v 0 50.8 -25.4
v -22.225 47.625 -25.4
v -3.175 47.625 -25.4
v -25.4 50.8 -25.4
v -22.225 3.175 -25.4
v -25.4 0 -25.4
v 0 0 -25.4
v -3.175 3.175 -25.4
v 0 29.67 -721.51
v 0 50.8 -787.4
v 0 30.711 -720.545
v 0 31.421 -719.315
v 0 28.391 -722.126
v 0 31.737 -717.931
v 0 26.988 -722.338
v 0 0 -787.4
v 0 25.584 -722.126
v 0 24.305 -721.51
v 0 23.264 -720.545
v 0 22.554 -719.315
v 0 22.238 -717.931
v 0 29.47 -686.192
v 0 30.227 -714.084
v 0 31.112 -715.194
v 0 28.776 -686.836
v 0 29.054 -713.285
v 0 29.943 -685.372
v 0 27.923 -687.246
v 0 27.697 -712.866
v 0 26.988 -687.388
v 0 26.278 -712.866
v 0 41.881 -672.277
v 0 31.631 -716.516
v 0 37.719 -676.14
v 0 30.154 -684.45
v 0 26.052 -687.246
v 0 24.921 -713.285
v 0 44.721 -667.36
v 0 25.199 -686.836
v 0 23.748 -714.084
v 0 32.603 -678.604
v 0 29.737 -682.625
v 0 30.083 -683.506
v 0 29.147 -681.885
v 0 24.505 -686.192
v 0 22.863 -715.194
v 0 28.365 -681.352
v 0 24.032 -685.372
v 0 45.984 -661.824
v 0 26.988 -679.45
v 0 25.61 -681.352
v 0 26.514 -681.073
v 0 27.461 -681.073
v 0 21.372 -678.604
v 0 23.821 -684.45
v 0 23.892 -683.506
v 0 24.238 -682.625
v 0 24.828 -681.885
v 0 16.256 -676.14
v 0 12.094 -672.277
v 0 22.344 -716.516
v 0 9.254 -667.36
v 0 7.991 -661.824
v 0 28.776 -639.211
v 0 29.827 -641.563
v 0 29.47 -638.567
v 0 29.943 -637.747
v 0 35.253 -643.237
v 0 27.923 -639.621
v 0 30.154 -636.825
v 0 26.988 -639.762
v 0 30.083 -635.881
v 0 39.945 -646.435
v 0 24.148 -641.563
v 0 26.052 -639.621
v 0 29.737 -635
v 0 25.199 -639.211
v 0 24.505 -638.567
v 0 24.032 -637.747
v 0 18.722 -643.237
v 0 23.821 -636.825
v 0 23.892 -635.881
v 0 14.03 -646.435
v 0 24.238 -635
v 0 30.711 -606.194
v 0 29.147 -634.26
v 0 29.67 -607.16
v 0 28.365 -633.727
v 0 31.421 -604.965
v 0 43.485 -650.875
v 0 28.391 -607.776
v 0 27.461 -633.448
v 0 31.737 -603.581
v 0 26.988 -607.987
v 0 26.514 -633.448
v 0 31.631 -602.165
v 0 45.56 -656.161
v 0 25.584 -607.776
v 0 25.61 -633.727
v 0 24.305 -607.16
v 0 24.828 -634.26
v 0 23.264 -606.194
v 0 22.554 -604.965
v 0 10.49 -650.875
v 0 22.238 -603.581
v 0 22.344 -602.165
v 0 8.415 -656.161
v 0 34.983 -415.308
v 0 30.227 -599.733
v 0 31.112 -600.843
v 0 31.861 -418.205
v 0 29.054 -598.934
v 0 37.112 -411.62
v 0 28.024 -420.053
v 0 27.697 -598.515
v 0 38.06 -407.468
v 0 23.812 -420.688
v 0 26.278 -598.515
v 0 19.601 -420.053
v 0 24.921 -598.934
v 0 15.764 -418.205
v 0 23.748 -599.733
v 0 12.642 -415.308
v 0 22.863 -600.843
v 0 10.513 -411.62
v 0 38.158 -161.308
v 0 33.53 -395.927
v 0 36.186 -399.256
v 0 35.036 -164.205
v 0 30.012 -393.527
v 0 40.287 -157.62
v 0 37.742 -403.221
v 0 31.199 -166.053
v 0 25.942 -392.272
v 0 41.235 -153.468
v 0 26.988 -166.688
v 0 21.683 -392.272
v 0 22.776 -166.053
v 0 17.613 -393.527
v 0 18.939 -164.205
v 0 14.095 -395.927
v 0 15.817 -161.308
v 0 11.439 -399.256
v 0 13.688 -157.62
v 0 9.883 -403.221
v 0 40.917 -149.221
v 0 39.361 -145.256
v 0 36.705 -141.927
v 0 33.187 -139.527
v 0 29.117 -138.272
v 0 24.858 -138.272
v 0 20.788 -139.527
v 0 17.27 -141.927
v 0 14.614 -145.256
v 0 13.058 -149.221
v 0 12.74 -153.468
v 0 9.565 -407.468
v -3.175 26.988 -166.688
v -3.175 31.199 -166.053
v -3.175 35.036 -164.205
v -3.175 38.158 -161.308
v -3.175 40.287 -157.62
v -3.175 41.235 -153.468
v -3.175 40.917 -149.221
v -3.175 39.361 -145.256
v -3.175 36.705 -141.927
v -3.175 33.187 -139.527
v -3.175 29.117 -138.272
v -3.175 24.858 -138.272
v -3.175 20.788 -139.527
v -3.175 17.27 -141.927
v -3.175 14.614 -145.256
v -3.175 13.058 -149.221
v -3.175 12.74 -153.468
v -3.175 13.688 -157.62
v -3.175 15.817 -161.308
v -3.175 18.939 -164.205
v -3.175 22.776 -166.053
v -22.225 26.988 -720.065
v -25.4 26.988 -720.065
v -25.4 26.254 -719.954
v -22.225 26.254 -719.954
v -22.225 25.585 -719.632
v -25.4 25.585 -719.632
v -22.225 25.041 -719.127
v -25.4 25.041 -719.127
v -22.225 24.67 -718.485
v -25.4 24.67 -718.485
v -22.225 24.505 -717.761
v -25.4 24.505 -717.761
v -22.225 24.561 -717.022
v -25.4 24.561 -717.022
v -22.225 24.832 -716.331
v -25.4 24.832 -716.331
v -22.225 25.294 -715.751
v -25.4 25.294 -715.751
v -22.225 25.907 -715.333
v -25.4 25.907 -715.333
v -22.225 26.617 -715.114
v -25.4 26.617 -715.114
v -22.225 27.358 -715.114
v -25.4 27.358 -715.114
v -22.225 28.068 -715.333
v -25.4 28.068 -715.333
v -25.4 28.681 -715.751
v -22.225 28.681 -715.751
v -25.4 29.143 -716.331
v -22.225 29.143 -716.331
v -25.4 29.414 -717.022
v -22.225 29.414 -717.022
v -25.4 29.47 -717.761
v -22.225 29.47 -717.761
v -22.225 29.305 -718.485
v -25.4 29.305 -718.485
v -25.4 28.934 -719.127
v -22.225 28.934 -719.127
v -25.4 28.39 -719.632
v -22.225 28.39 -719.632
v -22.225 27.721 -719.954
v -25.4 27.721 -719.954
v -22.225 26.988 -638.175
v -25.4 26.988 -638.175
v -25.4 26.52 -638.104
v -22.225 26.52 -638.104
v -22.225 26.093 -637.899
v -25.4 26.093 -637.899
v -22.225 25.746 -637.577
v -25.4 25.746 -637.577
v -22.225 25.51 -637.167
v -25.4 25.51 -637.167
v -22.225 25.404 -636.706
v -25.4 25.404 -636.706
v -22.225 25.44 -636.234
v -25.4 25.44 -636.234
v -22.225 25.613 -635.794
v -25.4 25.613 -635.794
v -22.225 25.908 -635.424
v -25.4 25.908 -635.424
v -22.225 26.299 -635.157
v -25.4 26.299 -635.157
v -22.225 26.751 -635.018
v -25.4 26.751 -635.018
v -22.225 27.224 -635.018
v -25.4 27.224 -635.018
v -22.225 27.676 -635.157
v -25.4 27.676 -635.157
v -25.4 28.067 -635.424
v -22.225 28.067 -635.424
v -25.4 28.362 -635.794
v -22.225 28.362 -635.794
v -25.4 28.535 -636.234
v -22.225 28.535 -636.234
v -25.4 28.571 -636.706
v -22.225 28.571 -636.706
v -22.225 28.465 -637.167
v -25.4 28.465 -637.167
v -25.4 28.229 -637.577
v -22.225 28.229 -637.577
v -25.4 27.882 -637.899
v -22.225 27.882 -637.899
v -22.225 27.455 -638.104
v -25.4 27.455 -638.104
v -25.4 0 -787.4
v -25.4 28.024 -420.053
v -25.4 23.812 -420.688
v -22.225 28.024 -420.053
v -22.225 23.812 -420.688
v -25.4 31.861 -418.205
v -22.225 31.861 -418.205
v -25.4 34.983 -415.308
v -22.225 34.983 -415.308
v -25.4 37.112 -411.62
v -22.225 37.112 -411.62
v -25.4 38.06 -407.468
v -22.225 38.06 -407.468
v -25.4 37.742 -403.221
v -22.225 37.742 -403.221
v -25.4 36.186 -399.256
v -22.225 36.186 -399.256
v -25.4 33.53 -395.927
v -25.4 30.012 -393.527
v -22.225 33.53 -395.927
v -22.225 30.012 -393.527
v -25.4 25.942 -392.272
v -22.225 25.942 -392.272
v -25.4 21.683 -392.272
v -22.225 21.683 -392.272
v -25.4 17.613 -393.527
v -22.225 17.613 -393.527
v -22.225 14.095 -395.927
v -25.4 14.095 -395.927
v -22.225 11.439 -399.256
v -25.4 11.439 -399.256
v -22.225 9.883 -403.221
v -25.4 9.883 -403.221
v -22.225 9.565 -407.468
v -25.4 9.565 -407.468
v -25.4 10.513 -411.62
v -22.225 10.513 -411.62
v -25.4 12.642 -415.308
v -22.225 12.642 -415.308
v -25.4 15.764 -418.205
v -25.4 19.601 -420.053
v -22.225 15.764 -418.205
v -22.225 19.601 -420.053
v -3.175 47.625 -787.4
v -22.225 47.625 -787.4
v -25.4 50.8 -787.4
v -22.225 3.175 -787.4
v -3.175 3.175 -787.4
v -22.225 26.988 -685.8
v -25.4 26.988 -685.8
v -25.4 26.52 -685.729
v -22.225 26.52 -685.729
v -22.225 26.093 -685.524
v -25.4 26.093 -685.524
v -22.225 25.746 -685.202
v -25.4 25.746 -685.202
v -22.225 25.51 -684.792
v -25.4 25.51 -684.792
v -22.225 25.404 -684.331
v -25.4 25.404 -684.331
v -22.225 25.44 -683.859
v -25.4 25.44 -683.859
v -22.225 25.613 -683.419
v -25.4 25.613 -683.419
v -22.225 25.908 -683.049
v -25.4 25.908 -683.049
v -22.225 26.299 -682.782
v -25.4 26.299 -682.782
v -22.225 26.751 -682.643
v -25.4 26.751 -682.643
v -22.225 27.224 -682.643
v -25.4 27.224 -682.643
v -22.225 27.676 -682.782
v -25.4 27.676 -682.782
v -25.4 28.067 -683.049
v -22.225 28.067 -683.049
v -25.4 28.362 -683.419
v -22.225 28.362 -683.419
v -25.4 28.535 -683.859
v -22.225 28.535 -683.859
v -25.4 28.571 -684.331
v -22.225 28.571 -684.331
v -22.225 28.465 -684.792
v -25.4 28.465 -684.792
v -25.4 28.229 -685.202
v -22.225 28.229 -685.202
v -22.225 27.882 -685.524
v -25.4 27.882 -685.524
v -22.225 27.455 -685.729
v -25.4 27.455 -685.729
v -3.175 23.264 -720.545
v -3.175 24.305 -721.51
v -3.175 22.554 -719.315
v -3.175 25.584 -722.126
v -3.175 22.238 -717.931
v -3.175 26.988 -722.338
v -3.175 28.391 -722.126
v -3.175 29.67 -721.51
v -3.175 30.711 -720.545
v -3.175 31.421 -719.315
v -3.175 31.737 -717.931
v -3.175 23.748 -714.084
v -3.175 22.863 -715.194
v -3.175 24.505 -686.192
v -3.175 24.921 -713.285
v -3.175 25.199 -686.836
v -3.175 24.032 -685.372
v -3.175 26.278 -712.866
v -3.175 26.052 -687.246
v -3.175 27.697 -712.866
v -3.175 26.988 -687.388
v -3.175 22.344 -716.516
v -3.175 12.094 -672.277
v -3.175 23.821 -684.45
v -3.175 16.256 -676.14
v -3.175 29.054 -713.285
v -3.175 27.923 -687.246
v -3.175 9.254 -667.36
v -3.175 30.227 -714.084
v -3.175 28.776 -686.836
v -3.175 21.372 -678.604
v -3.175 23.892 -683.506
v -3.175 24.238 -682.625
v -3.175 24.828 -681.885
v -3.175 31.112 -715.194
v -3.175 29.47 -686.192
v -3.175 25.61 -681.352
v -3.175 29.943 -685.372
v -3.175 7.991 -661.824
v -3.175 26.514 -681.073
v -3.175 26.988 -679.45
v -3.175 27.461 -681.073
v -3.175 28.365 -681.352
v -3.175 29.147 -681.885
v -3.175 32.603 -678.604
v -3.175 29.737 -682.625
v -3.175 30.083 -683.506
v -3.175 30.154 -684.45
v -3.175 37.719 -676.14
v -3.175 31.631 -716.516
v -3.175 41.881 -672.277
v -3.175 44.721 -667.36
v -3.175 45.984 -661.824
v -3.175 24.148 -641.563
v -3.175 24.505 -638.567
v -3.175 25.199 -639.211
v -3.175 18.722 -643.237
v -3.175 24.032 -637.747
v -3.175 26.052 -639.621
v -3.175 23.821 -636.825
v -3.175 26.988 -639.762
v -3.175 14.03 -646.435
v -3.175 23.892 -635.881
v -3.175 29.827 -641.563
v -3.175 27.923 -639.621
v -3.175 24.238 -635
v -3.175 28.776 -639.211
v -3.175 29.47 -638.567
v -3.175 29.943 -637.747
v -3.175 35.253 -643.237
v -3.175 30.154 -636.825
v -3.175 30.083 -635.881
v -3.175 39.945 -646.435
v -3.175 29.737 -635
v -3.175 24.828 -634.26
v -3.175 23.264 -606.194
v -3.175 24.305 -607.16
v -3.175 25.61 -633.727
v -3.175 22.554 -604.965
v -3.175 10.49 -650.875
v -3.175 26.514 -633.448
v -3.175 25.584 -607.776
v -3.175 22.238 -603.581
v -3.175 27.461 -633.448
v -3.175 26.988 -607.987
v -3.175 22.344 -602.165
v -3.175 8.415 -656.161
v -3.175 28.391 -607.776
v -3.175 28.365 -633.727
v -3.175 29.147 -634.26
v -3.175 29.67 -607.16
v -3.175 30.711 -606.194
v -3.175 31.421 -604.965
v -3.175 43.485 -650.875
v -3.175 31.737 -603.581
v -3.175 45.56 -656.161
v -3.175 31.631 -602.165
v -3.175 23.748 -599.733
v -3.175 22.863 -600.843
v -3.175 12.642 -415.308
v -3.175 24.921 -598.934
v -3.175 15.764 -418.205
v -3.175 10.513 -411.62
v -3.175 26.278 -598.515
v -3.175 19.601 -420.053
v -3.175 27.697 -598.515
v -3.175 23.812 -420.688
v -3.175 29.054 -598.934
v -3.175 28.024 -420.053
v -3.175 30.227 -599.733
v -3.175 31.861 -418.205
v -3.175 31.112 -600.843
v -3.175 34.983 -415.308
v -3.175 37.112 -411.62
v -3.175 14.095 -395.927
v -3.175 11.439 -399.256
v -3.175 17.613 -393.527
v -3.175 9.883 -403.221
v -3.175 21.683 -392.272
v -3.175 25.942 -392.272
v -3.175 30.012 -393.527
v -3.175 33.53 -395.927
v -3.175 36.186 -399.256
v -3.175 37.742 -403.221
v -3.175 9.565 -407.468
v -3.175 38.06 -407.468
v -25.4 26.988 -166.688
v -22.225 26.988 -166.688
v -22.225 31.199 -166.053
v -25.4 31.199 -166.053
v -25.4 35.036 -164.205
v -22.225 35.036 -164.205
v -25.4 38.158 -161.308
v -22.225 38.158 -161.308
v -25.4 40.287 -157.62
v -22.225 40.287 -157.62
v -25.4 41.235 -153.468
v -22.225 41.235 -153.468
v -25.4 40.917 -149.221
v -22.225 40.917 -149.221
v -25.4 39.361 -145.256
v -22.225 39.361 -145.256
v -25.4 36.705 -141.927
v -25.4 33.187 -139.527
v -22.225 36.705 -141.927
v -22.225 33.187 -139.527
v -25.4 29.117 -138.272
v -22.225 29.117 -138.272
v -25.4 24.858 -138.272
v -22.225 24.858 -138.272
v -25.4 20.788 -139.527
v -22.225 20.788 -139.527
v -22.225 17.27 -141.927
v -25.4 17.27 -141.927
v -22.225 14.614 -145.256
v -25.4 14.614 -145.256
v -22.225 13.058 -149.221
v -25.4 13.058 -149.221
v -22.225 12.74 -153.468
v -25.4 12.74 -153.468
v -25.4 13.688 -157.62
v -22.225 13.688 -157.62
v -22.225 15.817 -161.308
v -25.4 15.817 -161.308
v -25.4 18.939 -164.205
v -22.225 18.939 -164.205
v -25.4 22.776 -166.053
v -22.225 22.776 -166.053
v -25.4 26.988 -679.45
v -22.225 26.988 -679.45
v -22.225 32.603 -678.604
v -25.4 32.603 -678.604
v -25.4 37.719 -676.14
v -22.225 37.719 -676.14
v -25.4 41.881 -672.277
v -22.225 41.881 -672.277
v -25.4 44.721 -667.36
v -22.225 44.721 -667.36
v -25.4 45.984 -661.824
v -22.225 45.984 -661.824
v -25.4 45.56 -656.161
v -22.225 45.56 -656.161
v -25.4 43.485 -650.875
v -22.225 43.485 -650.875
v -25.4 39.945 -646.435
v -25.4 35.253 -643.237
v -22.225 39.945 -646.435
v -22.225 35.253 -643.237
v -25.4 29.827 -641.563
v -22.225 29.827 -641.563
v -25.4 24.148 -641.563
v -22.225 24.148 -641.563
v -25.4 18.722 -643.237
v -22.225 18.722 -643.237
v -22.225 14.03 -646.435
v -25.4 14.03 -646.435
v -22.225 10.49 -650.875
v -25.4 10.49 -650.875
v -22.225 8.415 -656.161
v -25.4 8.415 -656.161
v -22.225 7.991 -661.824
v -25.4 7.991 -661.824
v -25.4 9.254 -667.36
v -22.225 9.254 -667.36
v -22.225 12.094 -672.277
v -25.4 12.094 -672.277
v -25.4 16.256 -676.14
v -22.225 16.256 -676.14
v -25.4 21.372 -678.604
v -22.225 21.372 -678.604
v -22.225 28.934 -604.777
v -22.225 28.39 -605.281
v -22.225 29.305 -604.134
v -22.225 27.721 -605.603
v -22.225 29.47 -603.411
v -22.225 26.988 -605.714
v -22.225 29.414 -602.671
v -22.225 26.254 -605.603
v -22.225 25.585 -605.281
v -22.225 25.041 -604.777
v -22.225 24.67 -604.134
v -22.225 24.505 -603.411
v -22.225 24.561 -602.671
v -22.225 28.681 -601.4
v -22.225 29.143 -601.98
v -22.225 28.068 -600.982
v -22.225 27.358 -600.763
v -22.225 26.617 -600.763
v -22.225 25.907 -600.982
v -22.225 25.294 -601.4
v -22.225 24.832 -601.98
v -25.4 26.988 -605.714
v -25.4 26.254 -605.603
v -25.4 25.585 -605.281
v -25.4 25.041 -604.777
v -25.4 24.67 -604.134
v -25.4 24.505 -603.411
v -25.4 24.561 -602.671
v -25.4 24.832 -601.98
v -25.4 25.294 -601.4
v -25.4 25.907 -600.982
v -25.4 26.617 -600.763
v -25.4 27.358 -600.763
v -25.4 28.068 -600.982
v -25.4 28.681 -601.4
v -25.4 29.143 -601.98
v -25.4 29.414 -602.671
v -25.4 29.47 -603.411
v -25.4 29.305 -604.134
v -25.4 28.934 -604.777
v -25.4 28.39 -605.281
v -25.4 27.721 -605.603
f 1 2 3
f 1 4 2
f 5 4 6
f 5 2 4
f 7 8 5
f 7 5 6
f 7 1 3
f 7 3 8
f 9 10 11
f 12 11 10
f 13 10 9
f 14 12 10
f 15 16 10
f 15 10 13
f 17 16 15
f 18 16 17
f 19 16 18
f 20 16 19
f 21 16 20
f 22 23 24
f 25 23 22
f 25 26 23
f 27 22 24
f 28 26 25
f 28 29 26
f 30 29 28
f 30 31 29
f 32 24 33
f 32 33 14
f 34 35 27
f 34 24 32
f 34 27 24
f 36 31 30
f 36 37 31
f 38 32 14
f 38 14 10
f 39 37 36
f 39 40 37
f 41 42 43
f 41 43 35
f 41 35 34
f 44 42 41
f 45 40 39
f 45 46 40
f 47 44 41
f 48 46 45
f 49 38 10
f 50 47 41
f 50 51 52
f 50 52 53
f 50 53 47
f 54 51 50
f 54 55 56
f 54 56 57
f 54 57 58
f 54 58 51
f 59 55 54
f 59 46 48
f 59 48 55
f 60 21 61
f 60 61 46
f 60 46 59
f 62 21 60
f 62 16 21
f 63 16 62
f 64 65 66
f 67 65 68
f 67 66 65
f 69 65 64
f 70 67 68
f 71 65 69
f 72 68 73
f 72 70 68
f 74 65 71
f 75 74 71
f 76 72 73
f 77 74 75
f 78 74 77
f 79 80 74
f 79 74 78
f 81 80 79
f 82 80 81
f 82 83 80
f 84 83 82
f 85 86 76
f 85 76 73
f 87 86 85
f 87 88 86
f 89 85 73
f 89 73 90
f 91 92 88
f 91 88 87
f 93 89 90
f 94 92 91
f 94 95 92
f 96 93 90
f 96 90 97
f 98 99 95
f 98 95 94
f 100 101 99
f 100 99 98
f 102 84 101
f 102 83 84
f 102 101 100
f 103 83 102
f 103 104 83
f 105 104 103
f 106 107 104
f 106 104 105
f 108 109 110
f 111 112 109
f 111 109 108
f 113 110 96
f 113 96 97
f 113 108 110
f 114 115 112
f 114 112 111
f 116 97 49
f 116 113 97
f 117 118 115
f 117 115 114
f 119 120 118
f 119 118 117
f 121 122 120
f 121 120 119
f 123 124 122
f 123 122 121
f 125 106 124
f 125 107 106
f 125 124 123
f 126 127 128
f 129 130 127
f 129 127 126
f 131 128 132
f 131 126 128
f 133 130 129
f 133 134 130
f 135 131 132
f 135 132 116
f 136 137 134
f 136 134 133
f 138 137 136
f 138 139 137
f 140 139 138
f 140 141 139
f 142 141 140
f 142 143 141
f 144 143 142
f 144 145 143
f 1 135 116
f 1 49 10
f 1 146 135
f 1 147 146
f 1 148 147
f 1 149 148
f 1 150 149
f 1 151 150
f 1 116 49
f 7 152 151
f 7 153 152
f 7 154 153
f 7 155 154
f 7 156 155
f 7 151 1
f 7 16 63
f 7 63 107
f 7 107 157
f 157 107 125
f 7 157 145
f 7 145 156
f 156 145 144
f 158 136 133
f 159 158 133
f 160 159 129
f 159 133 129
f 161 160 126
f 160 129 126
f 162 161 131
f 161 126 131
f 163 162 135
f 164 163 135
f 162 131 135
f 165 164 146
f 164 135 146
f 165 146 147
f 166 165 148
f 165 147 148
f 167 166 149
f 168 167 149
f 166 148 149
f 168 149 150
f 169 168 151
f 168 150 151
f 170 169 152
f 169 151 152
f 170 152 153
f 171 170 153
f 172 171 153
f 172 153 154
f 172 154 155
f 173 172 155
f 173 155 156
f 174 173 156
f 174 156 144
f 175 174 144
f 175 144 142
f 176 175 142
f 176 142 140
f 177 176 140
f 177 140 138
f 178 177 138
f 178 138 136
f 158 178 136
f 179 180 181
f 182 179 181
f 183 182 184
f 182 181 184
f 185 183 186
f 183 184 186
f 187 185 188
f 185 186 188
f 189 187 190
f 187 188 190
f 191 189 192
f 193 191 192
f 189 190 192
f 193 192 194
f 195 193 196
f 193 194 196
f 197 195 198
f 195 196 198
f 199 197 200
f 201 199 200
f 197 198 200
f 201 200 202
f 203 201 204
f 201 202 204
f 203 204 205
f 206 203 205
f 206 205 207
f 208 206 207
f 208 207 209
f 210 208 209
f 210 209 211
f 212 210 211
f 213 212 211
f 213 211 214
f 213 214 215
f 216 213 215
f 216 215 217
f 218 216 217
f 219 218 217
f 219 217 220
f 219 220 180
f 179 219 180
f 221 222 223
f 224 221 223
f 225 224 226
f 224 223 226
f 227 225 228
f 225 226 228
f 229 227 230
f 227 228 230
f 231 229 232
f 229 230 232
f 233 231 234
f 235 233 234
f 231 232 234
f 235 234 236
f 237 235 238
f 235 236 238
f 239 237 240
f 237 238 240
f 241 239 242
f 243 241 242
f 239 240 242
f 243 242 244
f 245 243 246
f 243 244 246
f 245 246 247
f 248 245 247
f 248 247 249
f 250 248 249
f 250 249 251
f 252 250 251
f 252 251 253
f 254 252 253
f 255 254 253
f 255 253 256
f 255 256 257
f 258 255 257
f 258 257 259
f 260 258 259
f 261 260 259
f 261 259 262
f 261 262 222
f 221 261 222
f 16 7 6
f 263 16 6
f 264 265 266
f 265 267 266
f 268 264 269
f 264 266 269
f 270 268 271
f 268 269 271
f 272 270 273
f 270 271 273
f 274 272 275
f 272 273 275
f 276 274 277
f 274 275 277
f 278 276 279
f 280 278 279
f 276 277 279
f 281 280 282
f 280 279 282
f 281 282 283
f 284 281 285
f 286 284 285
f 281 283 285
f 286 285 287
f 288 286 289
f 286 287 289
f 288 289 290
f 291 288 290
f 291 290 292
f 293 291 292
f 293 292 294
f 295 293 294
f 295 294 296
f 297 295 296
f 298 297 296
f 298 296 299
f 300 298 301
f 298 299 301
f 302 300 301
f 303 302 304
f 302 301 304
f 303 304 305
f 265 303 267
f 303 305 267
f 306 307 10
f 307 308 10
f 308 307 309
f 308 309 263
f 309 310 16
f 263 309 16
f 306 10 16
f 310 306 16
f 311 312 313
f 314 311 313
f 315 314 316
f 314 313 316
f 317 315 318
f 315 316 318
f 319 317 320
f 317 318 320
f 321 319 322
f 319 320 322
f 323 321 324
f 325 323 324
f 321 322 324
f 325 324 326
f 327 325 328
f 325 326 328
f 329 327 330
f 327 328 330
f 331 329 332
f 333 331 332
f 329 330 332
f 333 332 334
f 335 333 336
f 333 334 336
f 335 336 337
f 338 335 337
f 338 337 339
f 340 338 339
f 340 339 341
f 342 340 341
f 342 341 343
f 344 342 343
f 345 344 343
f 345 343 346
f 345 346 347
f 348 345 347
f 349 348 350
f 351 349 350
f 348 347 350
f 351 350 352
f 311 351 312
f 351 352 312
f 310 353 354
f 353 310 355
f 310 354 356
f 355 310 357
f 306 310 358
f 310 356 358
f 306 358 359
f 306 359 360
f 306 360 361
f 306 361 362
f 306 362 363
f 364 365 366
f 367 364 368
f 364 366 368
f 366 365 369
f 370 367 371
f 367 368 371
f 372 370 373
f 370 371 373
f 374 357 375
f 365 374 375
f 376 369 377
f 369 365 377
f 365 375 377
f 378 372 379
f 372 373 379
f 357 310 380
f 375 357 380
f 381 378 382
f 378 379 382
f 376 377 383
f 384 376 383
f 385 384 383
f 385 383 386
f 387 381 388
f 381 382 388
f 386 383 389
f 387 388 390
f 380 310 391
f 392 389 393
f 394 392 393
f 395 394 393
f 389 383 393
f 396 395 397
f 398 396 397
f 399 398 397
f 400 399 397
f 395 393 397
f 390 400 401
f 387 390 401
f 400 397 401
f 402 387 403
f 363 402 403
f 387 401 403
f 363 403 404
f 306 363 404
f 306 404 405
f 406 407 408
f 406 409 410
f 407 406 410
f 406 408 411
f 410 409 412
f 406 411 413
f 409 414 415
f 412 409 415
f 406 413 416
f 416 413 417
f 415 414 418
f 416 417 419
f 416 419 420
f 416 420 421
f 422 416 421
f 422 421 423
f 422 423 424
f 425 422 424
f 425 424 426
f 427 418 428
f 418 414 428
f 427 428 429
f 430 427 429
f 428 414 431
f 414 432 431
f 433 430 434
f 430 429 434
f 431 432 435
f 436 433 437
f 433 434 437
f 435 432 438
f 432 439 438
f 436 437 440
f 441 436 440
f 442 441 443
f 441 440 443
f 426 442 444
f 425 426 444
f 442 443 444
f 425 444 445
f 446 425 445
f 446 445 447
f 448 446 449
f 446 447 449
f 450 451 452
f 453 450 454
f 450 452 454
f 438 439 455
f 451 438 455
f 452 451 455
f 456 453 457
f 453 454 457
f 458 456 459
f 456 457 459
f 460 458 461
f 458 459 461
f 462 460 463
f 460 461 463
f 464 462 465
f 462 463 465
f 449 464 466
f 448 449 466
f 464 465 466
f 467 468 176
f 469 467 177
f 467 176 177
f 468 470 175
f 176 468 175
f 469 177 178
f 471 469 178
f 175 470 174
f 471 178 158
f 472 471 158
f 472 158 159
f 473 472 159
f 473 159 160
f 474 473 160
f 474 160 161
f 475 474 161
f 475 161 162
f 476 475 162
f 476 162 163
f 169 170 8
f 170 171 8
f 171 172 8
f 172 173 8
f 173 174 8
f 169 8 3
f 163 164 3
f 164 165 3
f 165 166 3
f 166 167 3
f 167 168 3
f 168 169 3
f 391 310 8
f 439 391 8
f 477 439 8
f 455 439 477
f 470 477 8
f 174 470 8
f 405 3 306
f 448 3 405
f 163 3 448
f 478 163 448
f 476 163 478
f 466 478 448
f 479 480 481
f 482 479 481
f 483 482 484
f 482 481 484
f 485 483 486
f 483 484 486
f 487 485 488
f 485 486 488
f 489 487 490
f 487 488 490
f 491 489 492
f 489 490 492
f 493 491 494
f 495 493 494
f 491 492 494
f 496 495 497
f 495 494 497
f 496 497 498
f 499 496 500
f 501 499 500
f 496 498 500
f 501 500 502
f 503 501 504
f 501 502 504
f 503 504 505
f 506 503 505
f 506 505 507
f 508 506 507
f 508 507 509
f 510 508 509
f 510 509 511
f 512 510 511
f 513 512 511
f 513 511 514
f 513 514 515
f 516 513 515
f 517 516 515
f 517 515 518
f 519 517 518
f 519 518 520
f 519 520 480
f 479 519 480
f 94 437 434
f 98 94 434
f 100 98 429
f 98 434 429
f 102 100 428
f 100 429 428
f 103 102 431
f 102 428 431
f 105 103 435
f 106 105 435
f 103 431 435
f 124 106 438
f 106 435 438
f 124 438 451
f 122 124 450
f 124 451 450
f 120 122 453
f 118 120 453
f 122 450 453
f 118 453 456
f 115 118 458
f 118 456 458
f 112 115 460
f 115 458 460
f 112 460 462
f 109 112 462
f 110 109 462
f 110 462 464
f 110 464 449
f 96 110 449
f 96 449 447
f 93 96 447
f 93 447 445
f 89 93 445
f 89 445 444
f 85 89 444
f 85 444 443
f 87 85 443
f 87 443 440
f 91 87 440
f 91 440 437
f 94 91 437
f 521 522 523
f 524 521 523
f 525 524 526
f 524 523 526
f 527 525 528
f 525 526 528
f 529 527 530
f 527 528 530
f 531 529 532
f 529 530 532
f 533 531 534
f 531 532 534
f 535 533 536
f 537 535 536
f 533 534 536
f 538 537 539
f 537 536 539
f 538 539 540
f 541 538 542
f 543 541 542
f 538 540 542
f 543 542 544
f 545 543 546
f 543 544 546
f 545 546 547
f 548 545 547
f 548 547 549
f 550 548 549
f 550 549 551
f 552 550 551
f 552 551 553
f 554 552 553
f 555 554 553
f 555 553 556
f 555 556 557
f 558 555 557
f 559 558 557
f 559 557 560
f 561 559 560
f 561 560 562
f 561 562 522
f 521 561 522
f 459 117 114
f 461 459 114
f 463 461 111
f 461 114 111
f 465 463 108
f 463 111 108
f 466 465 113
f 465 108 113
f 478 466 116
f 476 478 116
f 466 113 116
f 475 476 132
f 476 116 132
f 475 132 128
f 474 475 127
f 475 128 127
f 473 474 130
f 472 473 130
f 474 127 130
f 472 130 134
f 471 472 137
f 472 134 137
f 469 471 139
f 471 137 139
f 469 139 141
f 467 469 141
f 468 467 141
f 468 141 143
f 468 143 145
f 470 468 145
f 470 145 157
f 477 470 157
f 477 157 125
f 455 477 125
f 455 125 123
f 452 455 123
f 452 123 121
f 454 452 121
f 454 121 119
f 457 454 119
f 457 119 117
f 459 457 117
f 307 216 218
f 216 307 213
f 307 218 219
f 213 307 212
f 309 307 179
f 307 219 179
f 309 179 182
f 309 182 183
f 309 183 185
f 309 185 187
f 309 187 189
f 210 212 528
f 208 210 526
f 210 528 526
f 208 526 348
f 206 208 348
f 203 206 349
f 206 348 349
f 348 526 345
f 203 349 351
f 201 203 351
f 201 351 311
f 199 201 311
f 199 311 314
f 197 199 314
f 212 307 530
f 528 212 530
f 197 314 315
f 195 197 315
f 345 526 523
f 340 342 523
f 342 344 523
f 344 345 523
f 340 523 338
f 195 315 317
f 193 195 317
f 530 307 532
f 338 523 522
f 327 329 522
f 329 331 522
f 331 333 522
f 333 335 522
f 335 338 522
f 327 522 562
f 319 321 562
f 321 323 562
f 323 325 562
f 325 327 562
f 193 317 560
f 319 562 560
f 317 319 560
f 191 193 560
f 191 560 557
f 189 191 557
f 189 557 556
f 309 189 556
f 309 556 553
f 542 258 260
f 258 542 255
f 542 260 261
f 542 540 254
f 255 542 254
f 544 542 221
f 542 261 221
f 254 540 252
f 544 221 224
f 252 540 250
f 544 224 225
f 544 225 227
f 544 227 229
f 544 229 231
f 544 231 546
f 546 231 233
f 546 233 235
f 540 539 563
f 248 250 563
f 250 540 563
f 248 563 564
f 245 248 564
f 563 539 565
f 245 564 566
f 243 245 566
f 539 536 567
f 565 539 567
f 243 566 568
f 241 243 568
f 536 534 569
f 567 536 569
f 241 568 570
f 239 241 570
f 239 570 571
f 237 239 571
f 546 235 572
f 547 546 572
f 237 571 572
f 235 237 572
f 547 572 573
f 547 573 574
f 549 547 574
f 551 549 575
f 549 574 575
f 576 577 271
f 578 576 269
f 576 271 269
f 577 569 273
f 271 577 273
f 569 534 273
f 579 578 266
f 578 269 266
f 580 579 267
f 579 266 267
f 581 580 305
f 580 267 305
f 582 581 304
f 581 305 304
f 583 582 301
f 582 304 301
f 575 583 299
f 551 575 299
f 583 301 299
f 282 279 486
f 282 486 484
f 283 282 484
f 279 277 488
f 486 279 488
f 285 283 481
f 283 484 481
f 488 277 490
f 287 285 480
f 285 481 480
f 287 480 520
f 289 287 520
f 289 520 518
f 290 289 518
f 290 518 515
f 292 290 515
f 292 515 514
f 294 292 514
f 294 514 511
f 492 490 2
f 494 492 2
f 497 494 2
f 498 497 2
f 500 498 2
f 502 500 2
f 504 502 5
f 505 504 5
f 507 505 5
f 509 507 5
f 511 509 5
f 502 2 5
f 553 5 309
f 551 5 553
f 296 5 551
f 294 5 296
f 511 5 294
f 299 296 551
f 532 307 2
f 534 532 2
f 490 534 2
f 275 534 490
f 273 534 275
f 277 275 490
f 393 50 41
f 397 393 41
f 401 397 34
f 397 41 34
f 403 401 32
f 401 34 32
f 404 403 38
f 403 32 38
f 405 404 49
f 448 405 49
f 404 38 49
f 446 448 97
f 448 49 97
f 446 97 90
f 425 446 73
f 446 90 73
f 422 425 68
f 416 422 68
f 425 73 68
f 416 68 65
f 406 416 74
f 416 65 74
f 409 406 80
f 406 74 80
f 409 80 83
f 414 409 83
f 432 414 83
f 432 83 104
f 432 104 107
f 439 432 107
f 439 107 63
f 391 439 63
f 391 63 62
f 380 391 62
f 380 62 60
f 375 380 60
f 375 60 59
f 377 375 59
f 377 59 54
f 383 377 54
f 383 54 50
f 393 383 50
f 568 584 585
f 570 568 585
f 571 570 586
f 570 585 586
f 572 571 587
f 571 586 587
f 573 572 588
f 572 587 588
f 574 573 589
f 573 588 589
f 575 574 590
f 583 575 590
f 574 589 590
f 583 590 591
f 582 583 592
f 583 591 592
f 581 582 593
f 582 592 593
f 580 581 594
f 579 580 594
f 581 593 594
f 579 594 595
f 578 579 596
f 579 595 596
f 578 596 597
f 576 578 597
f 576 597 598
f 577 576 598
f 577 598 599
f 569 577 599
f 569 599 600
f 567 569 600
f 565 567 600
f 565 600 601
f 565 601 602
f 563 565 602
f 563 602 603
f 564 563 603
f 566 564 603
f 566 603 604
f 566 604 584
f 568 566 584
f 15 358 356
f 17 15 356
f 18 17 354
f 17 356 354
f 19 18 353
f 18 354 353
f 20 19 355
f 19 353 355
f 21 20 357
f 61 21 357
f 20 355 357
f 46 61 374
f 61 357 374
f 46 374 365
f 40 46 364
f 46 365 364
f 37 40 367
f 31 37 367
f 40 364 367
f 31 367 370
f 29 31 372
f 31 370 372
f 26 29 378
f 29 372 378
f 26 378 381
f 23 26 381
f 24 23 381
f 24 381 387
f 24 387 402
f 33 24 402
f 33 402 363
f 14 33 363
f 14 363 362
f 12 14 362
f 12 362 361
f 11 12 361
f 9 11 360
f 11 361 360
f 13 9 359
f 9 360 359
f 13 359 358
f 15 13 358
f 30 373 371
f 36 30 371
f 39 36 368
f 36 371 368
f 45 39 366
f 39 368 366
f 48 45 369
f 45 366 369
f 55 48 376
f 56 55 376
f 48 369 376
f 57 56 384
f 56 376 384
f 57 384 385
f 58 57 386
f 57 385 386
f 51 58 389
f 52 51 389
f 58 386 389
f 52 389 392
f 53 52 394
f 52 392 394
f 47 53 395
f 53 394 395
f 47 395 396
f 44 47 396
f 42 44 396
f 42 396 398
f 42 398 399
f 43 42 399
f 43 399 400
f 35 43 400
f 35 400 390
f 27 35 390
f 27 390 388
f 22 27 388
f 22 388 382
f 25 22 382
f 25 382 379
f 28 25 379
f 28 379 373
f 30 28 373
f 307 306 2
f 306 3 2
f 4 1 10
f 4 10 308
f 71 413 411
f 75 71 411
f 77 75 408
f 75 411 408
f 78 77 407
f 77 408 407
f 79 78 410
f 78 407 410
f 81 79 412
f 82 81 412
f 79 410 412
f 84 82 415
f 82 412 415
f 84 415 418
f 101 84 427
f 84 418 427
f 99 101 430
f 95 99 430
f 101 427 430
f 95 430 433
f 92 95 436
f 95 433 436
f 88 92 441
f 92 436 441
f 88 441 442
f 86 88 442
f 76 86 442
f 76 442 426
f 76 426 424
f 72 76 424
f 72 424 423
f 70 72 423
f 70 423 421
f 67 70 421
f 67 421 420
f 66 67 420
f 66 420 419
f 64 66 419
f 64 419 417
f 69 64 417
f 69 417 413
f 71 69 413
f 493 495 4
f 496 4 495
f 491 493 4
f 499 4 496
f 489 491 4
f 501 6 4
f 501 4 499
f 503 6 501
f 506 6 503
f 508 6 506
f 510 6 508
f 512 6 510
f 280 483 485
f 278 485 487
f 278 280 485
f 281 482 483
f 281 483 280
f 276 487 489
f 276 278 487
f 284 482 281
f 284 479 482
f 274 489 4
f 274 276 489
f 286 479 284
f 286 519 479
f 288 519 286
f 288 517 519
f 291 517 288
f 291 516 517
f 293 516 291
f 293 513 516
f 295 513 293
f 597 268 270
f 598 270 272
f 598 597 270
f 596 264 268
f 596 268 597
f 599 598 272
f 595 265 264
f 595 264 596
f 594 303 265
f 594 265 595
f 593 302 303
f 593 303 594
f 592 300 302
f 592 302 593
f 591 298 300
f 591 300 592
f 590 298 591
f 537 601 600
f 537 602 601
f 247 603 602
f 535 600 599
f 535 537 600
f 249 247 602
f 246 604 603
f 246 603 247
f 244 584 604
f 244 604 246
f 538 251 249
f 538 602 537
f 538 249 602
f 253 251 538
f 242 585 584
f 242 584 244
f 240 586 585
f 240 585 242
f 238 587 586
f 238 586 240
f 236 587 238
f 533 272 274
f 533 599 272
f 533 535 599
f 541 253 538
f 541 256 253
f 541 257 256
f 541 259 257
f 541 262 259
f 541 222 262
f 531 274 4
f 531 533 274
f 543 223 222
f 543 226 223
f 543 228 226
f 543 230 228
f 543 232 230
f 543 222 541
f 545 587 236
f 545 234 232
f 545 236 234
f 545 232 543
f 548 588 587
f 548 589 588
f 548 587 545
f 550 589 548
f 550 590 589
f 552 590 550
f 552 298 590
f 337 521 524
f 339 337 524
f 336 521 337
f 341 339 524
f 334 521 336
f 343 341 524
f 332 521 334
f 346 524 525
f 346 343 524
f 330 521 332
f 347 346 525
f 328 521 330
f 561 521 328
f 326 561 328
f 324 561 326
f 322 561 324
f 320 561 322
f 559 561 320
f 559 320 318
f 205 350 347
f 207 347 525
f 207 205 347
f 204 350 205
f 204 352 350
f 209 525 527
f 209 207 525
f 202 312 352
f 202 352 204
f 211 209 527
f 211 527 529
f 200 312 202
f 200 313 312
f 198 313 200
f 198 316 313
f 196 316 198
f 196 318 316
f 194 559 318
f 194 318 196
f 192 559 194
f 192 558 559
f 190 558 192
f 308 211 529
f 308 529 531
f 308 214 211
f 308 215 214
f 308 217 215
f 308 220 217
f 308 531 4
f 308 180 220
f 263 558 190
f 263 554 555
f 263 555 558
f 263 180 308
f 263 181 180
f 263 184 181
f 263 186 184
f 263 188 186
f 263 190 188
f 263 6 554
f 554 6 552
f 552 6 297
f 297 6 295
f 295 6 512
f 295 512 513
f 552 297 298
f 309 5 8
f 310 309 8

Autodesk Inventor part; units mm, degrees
ref_plane "YZ Plane" through (0, 0, 0) normal (1, 0, 0) x (0, 1, 0)
ref_plane "XZ Plane" through (0, 0, 0) normal (0, 1, 0) x (-1, 0, 0)
ref_plane "XY Plane" through (0, 0, 0) normal (0, 0, 1) x (1, 0, 0)
sketch "Sketch1" plane through (0, 0, 0) normal (0, 1, 0) x (-1, 0, 0)
  point P0 (0, 0)
sketch "Sketch2" plane through (0, 0, 0) normal (0, 1, 0) x (-1, 0, 0)
  line L0 (0, 0) -> (25.4, 0)
  line L1 (25.4, 0) -> (25.4, -812.8)
  line L2 (25.4, -812.8) -> (0, -812.8)
  line L3 (0, -812.8) -> (0, 0)
  dimension "d0" = 812.8
  dimension "d1" = 25.4
extrude "Extrusion1" add sketch "Sketch2" along normal blind 50.8
sketch "Sketch3" plane through (0, 0, 0) normal (1, 0, 0) x (0, 0, -1)
  circle A0 centre (152.4, 26.9875) radius 14.2875
  line L0 (0, 0) -> (0, 50.8) projected
  line L1 (0, 50.8) -> (812.8, 50.8) projected
  circle A1 centre (660.4, 26.9875) radius 19.05
  line L2 (812.8, 0) -> (812.8, 50.8) projected
  line L3 (812.8, 0) -> (0, 0) projected
  circle A2 centre (406.4, 23.8125) radius 14.2875
  point P0 (406.4, 50.8)
  point P1 (406.4, 0)
  point P2 (406.4, 0)
  dimension "d4" = 28.575
  dimension "d5" = 152.4
  dimension "d6" = 23.8125
  dimension "d7" = 38.1
  dimension "d8" = 152.4
  dimension "d9" = 26.9875
  dimension "d10" = 28.575
  dimension "d11" = 26.9875
extrude "Extrusion2" cut sketch "Sketch3" against normal through all contours A0 | A1 | A2
sketch "Sketch4" plane through (-25.4, 0, 0) normal (0, 0, 1) x (1, 0, 0)
  line L0 (0, 50.8) -> (25.4, 50.8) projected
  line L1 (25.4, 0) -> (25.4, 50.8) projected
  line L2 (25.4, 0) -> (0, 0) projected
  line L3 (0, 0) -> (0, 50.8) projected
  line L4 (22.225, 47.625) -> (3.175, 47.625)
  line L5 (3.175, 47.625) -> (3.175, 3.175)
  line L6 (3.175, 3.175) -> (22.225, 3.175)
  line L7 (22.225, 3.175) -> (22.225, 47.625)
  dimension "d15" = 3.175
extrude "Extrusion3" cut sketch "Sketch4" against normal up to surface (812.8 mm away) contours L7 L6 L5 L4
sketch "Sketch5" plane through (0, 0, 0) normal (1, 0, 0) x (0, 0, -1)
  circle A0 centre (660.4, 26.9875) radius 19.05 projected
  circle A1 centre (152.4, 26.9875) radius 14.2875 projected
  circle A2 centre (406.4, 23.8125) radius 14.2875 projected
  line L0 (812.8, 0) -> (0, 0) projected
  line L1 (812.8, 0) -> (812.8, 50.8) projected
  line L2 (0, 50.8) -> (812.8, 50.8) projected
  line L3 (0, 0) -> (0, 50.8) projected
  line L4 (0, 50.8) -> (25.4, 50.8)
  line L5 (25.4, 50.8) -> (25.4, 0)
  line L6 (25.4, 0) -> (0, 0)
  line L7 (0, 0) -> (0, 50.8)
  line L8 (812.8, 0) -> (812.8, 50.8) projected
  line L9 (812.8, 0) -> (0, 0) projected
  line L10 (812.8, 50.8) -> (787.4, 50.8)
  line L11 (787.4, 50.8) -> (787.4, 0)
  line L12 (787.4, 0) -> (812.8, 0)
  line L13 (812.8, 0) -> (812.8, 50.8)
  dimension "d18" = 25.4
  dimension "d19" = 25.4
  dimension "d59" = 38.1
extrude "Extrusion4" cut sketch "Sketch5" against normal blind 25.4 contours L0 L11 L2 L1 | L0 L3 L2 L5
sketch "Sketch6" plane through (0, 0, -25.4) normal (1, 0, 0) x (0, 0, -1)
  line L0 (762, 0) -> (762, 50.8) projected
  circle A0 centre (635, 26.9875) radius 19.05 projected
  line L1 (0, 50.8) -> (762, 50.8) projected
  line L2 (0, 50.8) -> (0, 0) projected
  line L3 (762, 0) -> (0, 0) projected
  line L4 (762, 0) -> (762, 50.8) projected
  line L5 (0, 50.8) -> (762, 50.8) projected
  circle A1 centre (635, 26.9875) radius 19.05 projected
  circle A2 centre (127, 26.9875) radius 14.2875 projected
  circle A3 centre (381, 23.8125) radius 14.2875 projected
  point P0 (-25.4, 0)
  point P1 (658.8125, 26.9875)
  point P2 (611.1875, 26.9875)
  point P3 (692.1754, 26.9875)
  point P4 (577.8246, 26.9875)
  dimension "d37" = 47.625
  dimension "d38" = 23.8125
  dimension "d39" = 57.1754
  dimension "d40" = 57.1754
  dimension "d60" = 38.1
hole "Hole1" at (0, 26.9875, -717.5754) at (0, 26.9875, -603.2246) direction (-1, 0, 0) diameter 4.9784 end through all counterbore diameter 9.525 counterbore depth 6.35
sketch "Sketch7" plane through (0, 0, -25.4) normal (1, 0, 0) x (0, 0, -1)
  circle A0 centre (635, 26.9875) radius 19.05 projected
  point P0 (-25.4, 0)
  point P1 (658.8125, 26.9875)
  point P2 (611.1875, 26.9875)
  dimension "d48" = 47.625
  dimension "d49" = 23.8125
  dimension "d50" = 23.8125
  dimension "d58" = 38.1
hole "Hole2" at (0, 26.9875, -636.5875) at (0, 26.9875, -684.2125) direction (-1, 0, 0) diameter 3.175 end through all counterbore diameter 6.35 counterbore depth 6.35
equation "\"d9\" = d11"
equation "\"d38\" = 0.5 * d37"
equation "\"d40\" = d39"
equation "\"d50\" = d49"
properties part number "2x1 20in Alluminum with Cal DropRighttSide.ver1-1111-2019"
